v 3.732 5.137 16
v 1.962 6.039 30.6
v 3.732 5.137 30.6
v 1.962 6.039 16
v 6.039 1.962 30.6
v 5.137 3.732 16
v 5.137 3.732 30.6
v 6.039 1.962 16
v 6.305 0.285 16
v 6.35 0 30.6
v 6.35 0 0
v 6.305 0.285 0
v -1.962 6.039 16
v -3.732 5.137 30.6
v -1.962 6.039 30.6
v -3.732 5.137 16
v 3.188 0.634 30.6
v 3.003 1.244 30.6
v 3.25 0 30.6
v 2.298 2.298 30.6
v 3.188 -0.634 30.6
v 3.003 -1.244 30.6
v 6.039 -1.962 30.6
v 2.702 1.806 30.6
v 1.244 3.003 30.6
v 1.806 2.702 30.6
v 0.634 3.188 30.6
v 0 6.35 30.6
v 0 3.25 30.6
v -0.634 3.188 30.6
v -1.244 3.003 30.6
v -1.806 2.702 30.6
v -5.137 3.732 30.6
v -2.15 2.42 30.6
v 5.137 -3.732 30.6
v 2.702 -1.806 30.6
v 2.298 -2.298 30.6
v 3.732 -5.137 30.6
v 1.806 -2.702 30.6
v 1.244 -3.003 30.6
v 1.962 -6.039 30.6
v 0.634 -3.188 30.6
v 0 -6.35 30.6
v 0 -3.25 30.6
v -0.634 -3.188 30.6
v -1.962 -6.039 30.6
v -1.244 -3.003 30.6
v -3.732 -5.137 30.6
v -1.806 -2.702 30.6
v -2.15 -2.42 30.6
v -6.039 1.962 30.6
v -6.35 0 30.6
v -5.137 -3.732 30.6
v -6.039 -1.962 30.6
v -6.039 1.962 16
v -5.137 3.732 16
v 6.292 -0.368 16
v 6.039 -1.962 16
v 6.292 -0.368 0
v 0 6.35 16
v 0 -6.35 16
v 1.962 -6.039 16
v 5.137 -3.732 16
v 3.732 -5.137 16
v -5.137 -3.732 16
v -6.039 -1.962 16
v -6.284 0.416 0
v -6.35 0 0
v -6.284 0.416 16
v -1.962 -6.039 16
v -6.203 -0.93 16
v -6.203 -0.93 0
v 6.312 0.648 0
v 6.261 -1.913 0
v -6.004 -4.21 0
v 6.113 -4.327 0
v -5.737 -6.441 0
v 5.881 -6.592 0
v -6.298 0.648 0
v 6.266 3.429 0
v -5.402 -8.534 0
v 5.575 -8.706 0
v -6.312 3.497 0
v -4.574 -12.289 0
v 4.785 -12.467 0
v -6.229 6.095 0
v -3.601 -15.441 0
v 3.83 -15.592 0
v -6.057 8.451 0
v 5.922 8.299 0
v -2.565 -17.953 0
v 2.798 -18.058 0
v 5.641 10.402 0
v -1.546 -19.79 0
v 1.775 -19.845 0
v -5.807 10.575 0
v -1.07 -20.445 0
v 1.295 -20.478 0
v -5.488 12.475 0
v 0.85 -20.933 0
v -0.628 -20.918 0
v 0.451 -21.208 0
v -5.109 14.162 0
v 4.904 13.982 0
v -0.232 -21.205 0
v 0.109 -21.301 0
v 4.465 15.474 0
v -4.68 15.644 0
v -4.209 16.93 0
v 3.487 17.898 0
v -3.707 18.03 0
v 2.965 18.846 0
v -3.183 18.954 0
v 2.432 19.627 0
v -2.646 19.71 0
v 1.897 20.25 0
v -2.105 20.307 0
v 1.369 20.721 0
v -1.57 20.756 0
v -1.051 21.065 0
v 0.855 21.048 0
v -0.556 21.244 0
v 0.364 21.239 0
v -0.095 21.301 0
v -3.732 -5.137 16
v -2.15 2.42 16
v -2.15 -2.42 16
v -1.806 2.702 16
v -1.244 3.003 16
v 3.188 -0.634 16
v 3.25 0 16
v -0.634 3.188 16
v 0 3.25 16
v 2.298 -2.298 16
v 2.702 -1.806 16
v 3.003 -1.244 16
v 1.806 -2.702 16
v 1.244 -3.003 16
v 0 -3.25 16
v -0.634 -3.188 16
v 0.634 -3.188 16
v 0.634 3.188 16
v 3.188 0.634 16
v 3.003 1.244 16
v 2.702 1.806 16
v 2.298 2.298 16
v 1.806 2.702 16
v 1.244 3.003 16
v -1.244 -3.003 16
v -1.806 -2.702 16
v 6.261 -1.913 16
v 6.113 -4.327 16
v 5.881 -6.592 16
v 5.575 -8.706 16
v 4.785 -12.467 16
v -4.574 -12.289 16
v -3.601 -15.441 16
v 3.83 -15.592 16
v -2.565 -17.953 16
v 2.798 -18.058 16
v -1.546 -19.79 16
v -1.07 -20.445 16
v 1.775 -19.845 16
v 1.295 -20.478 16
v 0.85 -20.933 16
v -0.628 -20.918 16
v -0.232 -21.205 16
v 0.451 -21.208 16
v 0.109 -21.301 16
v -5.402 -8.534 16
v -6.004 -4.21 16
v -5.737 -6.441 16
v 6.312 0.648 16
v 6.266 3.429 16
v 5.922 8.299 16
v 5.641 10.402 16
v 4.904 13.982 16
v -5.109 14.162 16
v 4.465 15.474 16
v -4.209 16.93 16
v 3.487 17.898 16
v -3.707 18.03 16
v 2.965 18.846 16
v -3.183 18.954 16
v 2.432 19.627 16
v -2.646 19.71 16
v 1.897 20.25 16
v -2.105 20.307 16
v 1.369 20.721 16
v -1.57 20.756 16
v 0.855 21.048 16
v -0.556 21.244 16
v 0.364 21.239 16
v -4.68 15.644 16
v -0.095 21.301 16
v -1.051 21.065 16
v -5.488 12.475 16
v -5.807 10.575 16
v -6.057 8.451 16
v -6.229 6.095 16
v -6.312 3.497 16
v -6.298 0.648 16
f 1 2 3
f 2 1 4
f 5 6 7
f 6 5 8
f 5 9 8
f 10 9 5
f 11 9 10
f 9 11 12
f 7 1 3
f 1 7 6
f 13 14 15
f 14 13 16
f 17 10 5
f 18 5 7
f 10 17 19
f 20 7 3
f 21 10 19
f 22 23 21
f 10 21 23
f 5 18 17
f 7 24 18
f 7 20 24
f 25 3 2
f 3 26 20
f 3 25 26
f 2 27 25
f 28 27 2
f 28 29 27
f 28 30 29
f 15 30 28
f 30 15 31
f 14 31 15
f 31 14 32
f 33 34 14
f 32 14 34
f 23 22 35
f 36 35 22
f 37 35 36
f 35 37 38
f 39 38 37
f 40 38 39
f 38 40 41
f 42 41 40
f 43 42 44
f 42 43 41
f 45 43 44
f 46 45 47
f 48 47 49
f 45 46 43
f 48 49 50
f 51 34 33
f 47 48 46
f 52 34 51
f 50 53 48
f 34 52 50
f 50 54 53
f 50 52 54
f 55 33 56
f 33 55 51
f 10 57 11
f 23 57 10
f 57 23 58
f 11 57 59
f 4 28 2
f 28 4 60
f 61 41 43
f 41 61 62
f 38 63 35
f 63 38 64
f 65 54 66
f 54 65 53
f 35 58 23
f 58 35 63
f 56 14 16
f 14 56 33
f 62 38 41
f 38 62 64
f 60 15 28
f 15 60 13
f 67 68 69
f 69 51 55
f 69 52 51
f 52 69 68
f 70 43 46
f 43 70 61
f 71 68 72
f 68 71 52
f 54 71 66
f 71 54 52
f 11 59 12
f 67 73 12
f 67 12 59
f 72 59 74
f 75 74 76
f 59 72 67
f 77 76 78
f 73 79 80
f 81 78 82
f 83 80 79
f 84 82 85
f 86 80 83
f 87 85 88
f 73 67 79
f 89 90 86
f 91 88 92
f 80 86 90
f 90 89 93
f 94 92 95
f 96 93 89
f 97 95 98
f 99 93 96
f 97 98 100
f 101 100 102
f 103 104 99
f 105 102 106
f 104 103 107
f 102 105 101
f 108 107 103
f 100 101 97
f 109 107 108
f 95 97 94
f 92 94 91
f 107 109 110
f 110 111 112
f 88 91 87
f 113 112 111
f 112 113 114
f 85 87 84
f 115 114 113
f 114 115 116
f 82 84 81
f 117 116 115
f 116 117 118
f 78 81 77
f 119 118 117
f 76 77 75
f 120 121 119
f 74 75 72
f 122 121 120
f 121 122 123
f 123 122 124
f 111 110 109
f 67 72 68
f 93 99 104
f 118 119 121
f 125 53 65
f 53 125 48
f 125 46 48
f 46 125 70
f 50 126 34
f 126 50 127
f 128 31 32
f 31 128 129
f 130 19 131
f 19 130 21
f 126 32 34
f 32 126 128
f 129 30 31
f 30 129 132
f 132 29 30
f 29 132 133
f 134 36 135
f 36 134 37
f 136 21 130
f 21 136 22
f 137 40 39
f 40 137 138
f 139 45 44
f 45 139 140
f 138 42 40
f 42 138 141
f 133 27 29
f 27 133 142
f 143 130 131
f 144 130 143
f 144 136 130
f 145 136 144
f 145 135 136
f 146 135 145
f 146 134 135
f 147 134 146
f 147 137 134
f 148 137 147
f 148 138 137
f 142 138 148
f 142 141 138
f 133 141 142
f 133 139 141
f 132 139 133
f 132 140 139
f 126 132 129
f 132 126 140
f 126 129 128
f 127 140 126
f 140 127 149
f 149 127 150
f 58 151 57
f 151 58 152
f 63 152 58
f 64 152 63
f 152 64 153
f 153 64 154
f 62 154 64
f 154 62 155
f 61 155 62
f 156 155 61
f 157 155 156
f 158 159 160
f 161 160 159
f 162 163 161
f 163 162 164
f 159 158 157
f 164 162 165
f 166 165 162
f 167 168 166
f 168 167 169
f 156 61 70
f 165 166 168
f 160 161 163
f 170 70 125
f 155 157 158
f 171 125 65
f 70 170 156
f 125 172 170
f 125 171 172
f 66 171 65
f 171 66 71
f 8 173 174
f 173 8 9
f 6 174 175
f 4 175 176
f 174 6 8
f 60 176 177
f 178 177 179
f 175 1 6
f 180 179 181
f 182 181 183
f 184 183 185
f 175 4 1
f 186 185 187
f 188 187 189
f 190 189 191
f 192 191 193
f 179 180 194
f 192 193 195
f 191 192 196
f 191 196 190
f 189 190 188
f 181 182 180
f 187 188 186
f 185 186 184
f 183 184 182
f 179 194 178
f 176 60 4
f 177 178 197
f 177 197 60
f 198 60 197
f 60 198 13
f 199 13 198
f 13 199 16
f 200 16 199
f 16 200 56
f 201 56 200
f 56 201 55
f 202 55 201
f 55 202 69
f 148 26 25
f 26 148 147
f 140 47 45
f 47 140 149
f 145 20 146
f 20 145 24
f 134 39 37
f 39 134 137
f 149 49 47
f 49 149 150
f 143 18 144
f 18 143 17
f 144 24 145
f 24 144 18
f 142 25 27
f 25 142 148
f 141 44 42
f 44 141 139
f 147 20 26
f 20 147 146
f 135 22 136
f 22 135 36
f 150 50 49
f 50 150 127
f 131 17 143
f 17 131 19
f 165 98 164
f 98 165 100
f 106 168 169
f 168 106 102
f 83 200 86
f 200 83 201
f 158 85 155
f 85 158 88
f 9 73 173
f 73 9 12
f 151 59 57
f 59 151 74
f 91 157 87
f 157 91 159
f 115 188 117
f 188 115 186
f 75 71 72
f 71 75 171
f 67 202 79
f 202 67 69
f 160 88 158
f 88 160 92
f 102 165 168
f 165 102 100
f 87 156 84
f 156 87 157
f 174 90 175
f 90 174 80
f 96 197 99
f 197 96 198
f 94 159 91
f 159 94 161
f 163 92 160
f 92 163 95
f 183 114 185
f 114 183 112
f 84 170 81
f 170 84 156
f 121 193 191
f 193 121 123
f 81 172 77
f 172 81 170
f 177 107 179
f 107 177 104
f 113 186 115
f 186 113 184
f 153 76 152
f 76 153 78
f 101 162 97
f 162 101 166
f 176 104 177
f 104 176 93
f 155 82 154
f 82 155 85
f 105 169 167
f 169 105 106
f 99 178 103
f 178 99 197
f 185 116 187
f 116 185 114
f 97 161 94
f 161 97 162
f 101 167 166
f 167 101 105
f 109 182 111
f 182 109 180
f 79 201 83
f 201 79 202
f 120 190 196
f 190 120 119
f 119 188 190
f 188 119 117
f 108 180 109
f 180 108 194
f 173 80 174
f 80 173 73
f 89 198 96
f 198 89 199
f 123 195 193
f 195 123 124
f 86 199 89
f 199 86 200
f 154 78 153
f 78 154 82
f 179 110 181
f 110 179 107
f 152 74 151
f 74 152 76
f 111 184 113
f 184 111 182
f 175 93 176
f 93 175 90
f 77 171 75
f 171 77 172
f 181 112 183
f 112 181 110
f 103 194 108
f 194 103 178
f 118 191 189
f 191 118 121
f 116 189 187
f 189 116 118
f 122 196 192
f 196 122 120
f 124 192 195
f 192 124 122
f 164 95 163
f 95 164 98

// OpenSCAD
stalkLength = 14.6;
stalkDiameter = 12.7;
depth = 16;

shaftDiameter = 6.2;
shaftIncut = 1.1;
tolerance = 0.3;

height_hole = 10.000000000;

center_hole_1 = [-1.693493055,1.973164604];
size_hole_1 = [13.288683985,44.844631333];
stroke_width_hole_1 = 0.007000434;
// paths for hole_1
points_hole_1_1 = [ [-6.629671549,0.681638104],[-6.320210428,-4.431374119],[-6.038577292,-6.779659147],[-5.686645865,-8.982940642],[-4.814798420,-12.935924602],[-3.790488653,-16.253189133],[-2.699537125,-18.897597370],[-1.627764395,-20.832012448],[-1.125889004,-21.521367282],[-0.660991023,-22.019297502],[-0.243798022,-22.321160999],[0.114962430,-22.422315667],[0.474786017,-22.324596342],[0.894660699,-22.034732482],[1.363097315,-21.555432836],[1.868606708,-20.889406154],[2.944887183,-19.008006677],[4.031588852,-16.412204047],[5.036798441,-13.123668259],[5.868602676,-9.164069307],[6.190754888,-6.939393019],[6.435088285,-4.555077188],[6.590113706,-2.013830564],[6.644341993,0.681638104],[6.595772404,3.609904944],[6.233883727,8.736171848],[5.938343329,10.949937602],[5.162517139,14.718147936],[4.700010038,16.288358204],[3.670254545,18.840403167],[3.120784844,19.838003550],[2.560106301,20.660499659],[1.997108259,21.315774340],[1.440680065,21.811710437],[0.899711062,22.156190794],[0.383090597,22.357098256],[-0.100291986,22.422315667],[-0.585312438,22.361827967],[-1.106184650,22.173848383],[-1.653027982,21.848602185],[-2.215961794,21.376314645],[-2.785105444,20.747211033],[-3.350578290,19.951516621],[-3.902499693,18.979456679],[-4.430989010,17.821256479],[-4.926165601,16.467141292],[-5.378148824,14.907336388],[-5.777058039,13.132067039],[-6.113012605,11.131558516],[-6.376131879,8.896036090],[-6.556535222,6.415725032],[-6.644341993,3.680850613],[-6.629671549,0.681638104],[-6.629671549,0.681638104] ];

module hole() {
  scale(0.95)
  polygon(points=points_hole_1_1);
}


module shaftHole(constrict=0) {
    rotate([0,0,180])
    intersection() {
        circle(d=shaftDiameter+tolerance-constrict,$fn=32);
        translate([-shaftIncut-constrict*shaftIncut/shaftDiameter,0]) square(shaftDiameter+tolerance,center=true);
    }
}

module main() {
    linear_extrude(height=depth) hole();
    difference() {
        cylinder(d=stalkDiameter,h=depth+stalkLength);
        translate([0,0,depth]) linear_extrude(height=stalkLength+1) shaftHole();
    }
}

main();
